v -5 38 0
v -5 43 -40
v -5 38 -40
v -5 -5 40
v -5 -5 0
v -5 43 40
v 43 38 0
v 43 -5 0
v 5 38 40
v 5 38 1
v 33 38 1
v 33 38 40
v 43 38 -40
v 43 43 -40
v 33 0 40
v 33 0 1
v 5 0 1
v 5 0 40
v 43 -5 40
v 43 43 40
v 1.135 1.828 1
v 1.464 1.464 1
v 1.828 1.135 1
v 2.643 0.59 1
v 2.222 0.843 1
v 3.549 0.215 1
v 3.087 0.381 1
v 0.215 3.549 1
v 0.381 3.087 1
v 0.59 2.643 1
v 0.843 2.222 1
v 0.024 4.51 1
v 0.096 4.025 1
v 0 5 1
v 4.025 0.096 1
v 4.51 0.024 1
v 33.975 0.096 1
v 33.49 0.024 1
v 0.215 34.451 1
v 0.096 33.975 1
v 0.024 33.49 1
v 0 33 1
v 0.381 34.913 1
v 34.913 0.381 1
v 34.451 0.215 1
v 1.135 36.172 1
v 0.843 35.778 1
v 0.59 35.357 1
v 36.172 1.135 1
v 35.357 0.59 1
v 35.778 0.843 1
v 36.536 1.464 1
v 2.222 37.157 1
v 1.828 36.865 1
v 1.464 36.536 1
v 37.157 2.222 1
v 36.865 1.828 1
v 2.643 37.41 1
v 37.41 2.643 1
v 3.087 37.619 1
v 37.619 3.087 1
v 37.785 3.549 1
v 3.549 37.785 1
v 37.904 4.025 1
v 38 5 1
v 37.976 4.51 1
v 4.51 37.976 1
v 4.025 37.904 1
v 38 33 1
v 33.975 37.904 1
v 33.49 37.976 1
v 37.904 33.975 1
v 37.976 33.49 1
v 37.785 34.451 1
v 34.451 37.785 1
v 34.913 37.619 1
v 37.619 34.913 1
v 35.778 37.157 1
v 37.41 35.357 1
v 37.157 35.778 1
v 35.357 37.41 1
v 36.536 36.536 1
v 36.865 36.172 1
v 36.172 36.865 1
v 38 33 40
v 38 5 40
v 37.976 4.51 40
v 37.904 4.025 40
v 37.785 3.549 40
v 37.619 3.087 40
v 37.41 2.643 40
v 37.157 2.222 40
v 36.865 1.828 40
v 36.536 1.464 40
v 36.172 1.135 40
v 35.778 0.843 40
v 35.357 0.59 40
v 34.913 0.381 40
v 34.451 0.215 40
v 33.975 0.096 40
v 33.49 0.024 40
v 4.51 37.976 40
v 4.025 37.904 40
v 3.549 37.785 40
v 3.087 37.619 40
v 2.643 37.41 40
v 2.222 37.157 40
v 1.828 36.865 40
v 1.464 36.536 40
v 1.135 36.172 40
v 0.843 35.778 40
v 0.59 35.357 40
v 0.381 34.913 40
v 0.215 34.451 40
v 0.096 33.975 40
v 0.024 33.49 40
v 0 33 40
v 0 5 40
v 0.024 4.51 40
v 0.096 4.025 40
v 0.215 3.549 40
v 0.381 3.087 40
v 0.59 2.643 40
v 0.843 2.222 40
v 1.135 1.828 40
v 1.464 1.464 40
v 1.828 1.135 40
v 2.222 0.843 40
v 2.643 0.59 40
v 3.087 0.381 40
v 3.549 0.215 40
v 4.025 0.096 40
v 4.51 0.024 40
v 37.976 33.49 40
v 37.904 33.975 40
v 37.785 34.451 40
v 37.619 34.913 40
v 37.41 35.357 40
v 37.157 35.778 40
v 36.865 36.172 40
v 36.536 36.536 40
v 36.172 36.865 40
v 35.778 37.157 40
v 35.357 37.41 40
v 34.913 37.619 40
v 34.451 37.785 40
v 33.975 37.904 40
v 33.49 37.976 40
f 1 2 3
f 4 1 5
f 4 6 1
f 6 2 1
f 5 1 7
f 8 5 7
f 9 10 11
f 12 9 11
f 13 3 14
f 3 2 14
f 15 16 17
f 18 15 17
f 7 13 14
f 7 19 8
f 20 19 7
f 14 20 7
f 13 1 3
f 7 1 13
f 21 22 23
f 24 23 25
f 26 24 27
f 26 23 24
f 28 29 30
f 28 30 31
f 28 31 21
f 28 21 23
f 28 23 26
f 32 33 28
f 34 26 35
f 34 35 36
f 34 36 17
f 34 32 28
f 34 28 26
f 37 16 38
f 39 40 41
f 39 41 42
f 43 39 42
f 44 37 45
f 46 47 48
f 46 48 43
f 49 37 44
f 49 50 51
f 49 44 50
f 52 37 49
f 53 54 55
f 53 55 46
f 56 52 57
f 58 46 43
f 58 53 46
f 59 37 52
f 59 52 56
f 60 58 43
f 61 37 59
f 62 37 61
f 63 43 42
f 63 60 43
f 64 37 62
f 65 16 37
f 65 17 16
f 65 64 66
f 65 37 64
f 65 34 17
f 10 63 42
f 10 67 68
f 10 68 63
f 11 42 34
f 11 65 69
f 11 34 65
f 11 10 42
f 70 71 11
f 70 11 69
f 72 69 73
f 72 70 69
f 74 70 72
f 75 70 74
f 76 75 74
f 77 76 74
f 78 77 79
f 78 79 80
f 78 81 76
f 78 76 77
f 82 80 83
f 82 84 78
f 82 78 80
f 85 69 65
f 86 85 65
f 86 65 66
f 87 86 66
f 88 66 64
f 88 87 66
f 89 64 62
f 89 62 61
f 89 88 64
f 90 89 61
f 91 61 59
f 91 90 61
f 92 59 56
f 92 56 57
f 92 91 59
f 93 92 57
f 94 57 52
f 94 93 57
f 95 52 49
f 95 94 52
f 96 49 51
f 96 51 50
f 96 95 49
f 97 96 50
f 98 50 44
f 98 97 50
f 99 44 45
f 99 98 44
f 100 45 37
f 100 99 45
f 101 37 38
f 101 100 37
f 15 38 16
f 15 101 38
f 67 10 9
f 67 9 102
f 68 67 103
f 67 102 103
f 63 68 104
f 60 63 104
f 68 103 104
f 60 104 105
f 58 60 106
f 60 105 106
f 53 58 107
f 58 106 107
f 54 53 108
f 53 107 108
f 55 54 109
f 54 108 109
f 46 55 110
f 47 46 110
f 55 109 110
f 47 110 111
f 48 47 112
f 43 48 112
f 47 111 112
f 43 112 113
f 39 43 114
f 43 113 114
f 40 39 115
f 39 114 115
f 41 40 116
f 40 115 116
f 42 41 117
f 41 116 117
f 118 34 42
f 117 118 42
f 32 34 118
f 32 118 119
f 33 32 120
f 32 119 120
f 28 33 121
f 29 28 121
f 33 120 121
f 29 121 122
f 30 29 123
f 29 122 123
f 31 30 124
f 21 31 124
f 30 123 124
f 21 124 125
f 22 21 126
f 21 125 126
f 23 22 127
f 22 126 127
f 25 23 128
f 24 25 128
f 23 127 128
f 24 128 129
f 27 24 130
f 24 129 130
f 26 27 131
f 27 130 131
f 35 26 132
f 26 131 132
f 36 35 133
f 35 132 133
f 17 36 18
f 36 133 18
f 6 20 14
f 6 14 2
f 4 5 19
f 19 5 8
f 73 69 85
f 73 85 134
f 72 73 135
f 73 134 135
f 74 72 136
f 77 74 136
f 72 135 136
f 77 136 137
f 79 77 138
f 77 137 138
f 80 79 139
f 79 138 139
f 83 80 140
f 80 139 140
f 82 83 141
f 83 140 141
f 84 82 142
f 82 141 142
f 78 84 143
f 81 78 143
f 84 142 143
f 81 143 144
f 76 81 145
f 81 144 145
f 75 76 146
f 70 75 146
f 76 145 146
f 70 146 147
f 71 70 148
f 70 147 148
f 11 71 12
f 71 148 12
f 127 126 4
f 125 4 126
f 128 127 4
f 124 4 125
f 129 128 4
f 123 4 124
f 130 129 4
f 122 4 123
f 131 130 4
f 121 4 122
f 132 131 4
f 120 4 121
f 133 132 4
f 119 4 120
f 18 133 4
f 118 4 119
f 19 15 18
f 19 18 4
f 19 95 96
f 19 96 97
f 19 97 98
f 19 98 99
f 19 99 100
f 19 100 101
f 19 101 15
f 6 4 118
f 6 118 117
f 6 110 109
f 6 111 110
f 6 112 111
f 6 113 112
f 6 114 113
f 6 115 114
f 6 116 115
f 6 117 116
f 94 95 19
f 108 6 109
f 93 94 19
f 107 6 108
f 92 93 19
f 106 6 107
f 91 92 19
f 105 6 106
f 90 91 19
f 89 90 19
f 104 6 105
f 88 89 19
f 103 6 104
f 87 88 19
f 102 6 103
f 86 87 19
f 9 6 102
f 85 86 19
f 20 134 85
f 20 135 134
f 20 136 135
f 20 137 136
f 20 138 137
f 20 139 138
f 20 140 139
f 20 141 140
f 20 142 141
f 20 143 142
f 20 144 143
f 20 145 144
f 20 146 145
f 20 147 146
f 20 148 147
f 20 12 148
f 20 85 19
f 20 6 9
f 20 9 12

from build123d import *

# Parameters (mm, degrees)
F0_W     = 38
F0_H     = 38
F1_DEPTH = 1
F2_DEPTH = 40
F3_DEPTH = 40
F4_R     = 5


with BuildPart() as f1:
    # F0 (on Top) → F1 (new body)
    with BuildSketch(Plane.XY):
        with Locations((19, 19)):
            Rectangle(F0_W, F0_H)
    extrude(amount=F1_DEPTH)

    # F0 (on Top) → F2 (join)
    with BuildSketch(Plane.XY):
        Polygon((38, 0), (0, 0), (0, 38), (-5, 38), (-5, -5), (43, -5), (43, 38), (38, 38), align=None)
        Polygon((-5, 38), (0, 38), (38, 38), (43, 38), (43, 43), (-5, 43), align=None)
    extrude(amount=F2_DEPTH)

    # F0 (on Top) → F3 (join)
    with BuildSketch(Plane.XY):
        Polygon((-5, 38), (0, 38), (38, 38), (43, 38), (43, 43), (-5, 43), align=None)
    extrude(amount=-F3_DEPTH)

    # F4
    f4_edges = [f1.edges().sort_by_distance(p)[0] for p in [
        (0, 38, 20.5),
        (38, 38, 20.5),
        (38, 0, 20.5),
        (0, 0, 20.5),
    ]]
    fillet(f4_edges, radius=F4_R)


solid = f1.part
